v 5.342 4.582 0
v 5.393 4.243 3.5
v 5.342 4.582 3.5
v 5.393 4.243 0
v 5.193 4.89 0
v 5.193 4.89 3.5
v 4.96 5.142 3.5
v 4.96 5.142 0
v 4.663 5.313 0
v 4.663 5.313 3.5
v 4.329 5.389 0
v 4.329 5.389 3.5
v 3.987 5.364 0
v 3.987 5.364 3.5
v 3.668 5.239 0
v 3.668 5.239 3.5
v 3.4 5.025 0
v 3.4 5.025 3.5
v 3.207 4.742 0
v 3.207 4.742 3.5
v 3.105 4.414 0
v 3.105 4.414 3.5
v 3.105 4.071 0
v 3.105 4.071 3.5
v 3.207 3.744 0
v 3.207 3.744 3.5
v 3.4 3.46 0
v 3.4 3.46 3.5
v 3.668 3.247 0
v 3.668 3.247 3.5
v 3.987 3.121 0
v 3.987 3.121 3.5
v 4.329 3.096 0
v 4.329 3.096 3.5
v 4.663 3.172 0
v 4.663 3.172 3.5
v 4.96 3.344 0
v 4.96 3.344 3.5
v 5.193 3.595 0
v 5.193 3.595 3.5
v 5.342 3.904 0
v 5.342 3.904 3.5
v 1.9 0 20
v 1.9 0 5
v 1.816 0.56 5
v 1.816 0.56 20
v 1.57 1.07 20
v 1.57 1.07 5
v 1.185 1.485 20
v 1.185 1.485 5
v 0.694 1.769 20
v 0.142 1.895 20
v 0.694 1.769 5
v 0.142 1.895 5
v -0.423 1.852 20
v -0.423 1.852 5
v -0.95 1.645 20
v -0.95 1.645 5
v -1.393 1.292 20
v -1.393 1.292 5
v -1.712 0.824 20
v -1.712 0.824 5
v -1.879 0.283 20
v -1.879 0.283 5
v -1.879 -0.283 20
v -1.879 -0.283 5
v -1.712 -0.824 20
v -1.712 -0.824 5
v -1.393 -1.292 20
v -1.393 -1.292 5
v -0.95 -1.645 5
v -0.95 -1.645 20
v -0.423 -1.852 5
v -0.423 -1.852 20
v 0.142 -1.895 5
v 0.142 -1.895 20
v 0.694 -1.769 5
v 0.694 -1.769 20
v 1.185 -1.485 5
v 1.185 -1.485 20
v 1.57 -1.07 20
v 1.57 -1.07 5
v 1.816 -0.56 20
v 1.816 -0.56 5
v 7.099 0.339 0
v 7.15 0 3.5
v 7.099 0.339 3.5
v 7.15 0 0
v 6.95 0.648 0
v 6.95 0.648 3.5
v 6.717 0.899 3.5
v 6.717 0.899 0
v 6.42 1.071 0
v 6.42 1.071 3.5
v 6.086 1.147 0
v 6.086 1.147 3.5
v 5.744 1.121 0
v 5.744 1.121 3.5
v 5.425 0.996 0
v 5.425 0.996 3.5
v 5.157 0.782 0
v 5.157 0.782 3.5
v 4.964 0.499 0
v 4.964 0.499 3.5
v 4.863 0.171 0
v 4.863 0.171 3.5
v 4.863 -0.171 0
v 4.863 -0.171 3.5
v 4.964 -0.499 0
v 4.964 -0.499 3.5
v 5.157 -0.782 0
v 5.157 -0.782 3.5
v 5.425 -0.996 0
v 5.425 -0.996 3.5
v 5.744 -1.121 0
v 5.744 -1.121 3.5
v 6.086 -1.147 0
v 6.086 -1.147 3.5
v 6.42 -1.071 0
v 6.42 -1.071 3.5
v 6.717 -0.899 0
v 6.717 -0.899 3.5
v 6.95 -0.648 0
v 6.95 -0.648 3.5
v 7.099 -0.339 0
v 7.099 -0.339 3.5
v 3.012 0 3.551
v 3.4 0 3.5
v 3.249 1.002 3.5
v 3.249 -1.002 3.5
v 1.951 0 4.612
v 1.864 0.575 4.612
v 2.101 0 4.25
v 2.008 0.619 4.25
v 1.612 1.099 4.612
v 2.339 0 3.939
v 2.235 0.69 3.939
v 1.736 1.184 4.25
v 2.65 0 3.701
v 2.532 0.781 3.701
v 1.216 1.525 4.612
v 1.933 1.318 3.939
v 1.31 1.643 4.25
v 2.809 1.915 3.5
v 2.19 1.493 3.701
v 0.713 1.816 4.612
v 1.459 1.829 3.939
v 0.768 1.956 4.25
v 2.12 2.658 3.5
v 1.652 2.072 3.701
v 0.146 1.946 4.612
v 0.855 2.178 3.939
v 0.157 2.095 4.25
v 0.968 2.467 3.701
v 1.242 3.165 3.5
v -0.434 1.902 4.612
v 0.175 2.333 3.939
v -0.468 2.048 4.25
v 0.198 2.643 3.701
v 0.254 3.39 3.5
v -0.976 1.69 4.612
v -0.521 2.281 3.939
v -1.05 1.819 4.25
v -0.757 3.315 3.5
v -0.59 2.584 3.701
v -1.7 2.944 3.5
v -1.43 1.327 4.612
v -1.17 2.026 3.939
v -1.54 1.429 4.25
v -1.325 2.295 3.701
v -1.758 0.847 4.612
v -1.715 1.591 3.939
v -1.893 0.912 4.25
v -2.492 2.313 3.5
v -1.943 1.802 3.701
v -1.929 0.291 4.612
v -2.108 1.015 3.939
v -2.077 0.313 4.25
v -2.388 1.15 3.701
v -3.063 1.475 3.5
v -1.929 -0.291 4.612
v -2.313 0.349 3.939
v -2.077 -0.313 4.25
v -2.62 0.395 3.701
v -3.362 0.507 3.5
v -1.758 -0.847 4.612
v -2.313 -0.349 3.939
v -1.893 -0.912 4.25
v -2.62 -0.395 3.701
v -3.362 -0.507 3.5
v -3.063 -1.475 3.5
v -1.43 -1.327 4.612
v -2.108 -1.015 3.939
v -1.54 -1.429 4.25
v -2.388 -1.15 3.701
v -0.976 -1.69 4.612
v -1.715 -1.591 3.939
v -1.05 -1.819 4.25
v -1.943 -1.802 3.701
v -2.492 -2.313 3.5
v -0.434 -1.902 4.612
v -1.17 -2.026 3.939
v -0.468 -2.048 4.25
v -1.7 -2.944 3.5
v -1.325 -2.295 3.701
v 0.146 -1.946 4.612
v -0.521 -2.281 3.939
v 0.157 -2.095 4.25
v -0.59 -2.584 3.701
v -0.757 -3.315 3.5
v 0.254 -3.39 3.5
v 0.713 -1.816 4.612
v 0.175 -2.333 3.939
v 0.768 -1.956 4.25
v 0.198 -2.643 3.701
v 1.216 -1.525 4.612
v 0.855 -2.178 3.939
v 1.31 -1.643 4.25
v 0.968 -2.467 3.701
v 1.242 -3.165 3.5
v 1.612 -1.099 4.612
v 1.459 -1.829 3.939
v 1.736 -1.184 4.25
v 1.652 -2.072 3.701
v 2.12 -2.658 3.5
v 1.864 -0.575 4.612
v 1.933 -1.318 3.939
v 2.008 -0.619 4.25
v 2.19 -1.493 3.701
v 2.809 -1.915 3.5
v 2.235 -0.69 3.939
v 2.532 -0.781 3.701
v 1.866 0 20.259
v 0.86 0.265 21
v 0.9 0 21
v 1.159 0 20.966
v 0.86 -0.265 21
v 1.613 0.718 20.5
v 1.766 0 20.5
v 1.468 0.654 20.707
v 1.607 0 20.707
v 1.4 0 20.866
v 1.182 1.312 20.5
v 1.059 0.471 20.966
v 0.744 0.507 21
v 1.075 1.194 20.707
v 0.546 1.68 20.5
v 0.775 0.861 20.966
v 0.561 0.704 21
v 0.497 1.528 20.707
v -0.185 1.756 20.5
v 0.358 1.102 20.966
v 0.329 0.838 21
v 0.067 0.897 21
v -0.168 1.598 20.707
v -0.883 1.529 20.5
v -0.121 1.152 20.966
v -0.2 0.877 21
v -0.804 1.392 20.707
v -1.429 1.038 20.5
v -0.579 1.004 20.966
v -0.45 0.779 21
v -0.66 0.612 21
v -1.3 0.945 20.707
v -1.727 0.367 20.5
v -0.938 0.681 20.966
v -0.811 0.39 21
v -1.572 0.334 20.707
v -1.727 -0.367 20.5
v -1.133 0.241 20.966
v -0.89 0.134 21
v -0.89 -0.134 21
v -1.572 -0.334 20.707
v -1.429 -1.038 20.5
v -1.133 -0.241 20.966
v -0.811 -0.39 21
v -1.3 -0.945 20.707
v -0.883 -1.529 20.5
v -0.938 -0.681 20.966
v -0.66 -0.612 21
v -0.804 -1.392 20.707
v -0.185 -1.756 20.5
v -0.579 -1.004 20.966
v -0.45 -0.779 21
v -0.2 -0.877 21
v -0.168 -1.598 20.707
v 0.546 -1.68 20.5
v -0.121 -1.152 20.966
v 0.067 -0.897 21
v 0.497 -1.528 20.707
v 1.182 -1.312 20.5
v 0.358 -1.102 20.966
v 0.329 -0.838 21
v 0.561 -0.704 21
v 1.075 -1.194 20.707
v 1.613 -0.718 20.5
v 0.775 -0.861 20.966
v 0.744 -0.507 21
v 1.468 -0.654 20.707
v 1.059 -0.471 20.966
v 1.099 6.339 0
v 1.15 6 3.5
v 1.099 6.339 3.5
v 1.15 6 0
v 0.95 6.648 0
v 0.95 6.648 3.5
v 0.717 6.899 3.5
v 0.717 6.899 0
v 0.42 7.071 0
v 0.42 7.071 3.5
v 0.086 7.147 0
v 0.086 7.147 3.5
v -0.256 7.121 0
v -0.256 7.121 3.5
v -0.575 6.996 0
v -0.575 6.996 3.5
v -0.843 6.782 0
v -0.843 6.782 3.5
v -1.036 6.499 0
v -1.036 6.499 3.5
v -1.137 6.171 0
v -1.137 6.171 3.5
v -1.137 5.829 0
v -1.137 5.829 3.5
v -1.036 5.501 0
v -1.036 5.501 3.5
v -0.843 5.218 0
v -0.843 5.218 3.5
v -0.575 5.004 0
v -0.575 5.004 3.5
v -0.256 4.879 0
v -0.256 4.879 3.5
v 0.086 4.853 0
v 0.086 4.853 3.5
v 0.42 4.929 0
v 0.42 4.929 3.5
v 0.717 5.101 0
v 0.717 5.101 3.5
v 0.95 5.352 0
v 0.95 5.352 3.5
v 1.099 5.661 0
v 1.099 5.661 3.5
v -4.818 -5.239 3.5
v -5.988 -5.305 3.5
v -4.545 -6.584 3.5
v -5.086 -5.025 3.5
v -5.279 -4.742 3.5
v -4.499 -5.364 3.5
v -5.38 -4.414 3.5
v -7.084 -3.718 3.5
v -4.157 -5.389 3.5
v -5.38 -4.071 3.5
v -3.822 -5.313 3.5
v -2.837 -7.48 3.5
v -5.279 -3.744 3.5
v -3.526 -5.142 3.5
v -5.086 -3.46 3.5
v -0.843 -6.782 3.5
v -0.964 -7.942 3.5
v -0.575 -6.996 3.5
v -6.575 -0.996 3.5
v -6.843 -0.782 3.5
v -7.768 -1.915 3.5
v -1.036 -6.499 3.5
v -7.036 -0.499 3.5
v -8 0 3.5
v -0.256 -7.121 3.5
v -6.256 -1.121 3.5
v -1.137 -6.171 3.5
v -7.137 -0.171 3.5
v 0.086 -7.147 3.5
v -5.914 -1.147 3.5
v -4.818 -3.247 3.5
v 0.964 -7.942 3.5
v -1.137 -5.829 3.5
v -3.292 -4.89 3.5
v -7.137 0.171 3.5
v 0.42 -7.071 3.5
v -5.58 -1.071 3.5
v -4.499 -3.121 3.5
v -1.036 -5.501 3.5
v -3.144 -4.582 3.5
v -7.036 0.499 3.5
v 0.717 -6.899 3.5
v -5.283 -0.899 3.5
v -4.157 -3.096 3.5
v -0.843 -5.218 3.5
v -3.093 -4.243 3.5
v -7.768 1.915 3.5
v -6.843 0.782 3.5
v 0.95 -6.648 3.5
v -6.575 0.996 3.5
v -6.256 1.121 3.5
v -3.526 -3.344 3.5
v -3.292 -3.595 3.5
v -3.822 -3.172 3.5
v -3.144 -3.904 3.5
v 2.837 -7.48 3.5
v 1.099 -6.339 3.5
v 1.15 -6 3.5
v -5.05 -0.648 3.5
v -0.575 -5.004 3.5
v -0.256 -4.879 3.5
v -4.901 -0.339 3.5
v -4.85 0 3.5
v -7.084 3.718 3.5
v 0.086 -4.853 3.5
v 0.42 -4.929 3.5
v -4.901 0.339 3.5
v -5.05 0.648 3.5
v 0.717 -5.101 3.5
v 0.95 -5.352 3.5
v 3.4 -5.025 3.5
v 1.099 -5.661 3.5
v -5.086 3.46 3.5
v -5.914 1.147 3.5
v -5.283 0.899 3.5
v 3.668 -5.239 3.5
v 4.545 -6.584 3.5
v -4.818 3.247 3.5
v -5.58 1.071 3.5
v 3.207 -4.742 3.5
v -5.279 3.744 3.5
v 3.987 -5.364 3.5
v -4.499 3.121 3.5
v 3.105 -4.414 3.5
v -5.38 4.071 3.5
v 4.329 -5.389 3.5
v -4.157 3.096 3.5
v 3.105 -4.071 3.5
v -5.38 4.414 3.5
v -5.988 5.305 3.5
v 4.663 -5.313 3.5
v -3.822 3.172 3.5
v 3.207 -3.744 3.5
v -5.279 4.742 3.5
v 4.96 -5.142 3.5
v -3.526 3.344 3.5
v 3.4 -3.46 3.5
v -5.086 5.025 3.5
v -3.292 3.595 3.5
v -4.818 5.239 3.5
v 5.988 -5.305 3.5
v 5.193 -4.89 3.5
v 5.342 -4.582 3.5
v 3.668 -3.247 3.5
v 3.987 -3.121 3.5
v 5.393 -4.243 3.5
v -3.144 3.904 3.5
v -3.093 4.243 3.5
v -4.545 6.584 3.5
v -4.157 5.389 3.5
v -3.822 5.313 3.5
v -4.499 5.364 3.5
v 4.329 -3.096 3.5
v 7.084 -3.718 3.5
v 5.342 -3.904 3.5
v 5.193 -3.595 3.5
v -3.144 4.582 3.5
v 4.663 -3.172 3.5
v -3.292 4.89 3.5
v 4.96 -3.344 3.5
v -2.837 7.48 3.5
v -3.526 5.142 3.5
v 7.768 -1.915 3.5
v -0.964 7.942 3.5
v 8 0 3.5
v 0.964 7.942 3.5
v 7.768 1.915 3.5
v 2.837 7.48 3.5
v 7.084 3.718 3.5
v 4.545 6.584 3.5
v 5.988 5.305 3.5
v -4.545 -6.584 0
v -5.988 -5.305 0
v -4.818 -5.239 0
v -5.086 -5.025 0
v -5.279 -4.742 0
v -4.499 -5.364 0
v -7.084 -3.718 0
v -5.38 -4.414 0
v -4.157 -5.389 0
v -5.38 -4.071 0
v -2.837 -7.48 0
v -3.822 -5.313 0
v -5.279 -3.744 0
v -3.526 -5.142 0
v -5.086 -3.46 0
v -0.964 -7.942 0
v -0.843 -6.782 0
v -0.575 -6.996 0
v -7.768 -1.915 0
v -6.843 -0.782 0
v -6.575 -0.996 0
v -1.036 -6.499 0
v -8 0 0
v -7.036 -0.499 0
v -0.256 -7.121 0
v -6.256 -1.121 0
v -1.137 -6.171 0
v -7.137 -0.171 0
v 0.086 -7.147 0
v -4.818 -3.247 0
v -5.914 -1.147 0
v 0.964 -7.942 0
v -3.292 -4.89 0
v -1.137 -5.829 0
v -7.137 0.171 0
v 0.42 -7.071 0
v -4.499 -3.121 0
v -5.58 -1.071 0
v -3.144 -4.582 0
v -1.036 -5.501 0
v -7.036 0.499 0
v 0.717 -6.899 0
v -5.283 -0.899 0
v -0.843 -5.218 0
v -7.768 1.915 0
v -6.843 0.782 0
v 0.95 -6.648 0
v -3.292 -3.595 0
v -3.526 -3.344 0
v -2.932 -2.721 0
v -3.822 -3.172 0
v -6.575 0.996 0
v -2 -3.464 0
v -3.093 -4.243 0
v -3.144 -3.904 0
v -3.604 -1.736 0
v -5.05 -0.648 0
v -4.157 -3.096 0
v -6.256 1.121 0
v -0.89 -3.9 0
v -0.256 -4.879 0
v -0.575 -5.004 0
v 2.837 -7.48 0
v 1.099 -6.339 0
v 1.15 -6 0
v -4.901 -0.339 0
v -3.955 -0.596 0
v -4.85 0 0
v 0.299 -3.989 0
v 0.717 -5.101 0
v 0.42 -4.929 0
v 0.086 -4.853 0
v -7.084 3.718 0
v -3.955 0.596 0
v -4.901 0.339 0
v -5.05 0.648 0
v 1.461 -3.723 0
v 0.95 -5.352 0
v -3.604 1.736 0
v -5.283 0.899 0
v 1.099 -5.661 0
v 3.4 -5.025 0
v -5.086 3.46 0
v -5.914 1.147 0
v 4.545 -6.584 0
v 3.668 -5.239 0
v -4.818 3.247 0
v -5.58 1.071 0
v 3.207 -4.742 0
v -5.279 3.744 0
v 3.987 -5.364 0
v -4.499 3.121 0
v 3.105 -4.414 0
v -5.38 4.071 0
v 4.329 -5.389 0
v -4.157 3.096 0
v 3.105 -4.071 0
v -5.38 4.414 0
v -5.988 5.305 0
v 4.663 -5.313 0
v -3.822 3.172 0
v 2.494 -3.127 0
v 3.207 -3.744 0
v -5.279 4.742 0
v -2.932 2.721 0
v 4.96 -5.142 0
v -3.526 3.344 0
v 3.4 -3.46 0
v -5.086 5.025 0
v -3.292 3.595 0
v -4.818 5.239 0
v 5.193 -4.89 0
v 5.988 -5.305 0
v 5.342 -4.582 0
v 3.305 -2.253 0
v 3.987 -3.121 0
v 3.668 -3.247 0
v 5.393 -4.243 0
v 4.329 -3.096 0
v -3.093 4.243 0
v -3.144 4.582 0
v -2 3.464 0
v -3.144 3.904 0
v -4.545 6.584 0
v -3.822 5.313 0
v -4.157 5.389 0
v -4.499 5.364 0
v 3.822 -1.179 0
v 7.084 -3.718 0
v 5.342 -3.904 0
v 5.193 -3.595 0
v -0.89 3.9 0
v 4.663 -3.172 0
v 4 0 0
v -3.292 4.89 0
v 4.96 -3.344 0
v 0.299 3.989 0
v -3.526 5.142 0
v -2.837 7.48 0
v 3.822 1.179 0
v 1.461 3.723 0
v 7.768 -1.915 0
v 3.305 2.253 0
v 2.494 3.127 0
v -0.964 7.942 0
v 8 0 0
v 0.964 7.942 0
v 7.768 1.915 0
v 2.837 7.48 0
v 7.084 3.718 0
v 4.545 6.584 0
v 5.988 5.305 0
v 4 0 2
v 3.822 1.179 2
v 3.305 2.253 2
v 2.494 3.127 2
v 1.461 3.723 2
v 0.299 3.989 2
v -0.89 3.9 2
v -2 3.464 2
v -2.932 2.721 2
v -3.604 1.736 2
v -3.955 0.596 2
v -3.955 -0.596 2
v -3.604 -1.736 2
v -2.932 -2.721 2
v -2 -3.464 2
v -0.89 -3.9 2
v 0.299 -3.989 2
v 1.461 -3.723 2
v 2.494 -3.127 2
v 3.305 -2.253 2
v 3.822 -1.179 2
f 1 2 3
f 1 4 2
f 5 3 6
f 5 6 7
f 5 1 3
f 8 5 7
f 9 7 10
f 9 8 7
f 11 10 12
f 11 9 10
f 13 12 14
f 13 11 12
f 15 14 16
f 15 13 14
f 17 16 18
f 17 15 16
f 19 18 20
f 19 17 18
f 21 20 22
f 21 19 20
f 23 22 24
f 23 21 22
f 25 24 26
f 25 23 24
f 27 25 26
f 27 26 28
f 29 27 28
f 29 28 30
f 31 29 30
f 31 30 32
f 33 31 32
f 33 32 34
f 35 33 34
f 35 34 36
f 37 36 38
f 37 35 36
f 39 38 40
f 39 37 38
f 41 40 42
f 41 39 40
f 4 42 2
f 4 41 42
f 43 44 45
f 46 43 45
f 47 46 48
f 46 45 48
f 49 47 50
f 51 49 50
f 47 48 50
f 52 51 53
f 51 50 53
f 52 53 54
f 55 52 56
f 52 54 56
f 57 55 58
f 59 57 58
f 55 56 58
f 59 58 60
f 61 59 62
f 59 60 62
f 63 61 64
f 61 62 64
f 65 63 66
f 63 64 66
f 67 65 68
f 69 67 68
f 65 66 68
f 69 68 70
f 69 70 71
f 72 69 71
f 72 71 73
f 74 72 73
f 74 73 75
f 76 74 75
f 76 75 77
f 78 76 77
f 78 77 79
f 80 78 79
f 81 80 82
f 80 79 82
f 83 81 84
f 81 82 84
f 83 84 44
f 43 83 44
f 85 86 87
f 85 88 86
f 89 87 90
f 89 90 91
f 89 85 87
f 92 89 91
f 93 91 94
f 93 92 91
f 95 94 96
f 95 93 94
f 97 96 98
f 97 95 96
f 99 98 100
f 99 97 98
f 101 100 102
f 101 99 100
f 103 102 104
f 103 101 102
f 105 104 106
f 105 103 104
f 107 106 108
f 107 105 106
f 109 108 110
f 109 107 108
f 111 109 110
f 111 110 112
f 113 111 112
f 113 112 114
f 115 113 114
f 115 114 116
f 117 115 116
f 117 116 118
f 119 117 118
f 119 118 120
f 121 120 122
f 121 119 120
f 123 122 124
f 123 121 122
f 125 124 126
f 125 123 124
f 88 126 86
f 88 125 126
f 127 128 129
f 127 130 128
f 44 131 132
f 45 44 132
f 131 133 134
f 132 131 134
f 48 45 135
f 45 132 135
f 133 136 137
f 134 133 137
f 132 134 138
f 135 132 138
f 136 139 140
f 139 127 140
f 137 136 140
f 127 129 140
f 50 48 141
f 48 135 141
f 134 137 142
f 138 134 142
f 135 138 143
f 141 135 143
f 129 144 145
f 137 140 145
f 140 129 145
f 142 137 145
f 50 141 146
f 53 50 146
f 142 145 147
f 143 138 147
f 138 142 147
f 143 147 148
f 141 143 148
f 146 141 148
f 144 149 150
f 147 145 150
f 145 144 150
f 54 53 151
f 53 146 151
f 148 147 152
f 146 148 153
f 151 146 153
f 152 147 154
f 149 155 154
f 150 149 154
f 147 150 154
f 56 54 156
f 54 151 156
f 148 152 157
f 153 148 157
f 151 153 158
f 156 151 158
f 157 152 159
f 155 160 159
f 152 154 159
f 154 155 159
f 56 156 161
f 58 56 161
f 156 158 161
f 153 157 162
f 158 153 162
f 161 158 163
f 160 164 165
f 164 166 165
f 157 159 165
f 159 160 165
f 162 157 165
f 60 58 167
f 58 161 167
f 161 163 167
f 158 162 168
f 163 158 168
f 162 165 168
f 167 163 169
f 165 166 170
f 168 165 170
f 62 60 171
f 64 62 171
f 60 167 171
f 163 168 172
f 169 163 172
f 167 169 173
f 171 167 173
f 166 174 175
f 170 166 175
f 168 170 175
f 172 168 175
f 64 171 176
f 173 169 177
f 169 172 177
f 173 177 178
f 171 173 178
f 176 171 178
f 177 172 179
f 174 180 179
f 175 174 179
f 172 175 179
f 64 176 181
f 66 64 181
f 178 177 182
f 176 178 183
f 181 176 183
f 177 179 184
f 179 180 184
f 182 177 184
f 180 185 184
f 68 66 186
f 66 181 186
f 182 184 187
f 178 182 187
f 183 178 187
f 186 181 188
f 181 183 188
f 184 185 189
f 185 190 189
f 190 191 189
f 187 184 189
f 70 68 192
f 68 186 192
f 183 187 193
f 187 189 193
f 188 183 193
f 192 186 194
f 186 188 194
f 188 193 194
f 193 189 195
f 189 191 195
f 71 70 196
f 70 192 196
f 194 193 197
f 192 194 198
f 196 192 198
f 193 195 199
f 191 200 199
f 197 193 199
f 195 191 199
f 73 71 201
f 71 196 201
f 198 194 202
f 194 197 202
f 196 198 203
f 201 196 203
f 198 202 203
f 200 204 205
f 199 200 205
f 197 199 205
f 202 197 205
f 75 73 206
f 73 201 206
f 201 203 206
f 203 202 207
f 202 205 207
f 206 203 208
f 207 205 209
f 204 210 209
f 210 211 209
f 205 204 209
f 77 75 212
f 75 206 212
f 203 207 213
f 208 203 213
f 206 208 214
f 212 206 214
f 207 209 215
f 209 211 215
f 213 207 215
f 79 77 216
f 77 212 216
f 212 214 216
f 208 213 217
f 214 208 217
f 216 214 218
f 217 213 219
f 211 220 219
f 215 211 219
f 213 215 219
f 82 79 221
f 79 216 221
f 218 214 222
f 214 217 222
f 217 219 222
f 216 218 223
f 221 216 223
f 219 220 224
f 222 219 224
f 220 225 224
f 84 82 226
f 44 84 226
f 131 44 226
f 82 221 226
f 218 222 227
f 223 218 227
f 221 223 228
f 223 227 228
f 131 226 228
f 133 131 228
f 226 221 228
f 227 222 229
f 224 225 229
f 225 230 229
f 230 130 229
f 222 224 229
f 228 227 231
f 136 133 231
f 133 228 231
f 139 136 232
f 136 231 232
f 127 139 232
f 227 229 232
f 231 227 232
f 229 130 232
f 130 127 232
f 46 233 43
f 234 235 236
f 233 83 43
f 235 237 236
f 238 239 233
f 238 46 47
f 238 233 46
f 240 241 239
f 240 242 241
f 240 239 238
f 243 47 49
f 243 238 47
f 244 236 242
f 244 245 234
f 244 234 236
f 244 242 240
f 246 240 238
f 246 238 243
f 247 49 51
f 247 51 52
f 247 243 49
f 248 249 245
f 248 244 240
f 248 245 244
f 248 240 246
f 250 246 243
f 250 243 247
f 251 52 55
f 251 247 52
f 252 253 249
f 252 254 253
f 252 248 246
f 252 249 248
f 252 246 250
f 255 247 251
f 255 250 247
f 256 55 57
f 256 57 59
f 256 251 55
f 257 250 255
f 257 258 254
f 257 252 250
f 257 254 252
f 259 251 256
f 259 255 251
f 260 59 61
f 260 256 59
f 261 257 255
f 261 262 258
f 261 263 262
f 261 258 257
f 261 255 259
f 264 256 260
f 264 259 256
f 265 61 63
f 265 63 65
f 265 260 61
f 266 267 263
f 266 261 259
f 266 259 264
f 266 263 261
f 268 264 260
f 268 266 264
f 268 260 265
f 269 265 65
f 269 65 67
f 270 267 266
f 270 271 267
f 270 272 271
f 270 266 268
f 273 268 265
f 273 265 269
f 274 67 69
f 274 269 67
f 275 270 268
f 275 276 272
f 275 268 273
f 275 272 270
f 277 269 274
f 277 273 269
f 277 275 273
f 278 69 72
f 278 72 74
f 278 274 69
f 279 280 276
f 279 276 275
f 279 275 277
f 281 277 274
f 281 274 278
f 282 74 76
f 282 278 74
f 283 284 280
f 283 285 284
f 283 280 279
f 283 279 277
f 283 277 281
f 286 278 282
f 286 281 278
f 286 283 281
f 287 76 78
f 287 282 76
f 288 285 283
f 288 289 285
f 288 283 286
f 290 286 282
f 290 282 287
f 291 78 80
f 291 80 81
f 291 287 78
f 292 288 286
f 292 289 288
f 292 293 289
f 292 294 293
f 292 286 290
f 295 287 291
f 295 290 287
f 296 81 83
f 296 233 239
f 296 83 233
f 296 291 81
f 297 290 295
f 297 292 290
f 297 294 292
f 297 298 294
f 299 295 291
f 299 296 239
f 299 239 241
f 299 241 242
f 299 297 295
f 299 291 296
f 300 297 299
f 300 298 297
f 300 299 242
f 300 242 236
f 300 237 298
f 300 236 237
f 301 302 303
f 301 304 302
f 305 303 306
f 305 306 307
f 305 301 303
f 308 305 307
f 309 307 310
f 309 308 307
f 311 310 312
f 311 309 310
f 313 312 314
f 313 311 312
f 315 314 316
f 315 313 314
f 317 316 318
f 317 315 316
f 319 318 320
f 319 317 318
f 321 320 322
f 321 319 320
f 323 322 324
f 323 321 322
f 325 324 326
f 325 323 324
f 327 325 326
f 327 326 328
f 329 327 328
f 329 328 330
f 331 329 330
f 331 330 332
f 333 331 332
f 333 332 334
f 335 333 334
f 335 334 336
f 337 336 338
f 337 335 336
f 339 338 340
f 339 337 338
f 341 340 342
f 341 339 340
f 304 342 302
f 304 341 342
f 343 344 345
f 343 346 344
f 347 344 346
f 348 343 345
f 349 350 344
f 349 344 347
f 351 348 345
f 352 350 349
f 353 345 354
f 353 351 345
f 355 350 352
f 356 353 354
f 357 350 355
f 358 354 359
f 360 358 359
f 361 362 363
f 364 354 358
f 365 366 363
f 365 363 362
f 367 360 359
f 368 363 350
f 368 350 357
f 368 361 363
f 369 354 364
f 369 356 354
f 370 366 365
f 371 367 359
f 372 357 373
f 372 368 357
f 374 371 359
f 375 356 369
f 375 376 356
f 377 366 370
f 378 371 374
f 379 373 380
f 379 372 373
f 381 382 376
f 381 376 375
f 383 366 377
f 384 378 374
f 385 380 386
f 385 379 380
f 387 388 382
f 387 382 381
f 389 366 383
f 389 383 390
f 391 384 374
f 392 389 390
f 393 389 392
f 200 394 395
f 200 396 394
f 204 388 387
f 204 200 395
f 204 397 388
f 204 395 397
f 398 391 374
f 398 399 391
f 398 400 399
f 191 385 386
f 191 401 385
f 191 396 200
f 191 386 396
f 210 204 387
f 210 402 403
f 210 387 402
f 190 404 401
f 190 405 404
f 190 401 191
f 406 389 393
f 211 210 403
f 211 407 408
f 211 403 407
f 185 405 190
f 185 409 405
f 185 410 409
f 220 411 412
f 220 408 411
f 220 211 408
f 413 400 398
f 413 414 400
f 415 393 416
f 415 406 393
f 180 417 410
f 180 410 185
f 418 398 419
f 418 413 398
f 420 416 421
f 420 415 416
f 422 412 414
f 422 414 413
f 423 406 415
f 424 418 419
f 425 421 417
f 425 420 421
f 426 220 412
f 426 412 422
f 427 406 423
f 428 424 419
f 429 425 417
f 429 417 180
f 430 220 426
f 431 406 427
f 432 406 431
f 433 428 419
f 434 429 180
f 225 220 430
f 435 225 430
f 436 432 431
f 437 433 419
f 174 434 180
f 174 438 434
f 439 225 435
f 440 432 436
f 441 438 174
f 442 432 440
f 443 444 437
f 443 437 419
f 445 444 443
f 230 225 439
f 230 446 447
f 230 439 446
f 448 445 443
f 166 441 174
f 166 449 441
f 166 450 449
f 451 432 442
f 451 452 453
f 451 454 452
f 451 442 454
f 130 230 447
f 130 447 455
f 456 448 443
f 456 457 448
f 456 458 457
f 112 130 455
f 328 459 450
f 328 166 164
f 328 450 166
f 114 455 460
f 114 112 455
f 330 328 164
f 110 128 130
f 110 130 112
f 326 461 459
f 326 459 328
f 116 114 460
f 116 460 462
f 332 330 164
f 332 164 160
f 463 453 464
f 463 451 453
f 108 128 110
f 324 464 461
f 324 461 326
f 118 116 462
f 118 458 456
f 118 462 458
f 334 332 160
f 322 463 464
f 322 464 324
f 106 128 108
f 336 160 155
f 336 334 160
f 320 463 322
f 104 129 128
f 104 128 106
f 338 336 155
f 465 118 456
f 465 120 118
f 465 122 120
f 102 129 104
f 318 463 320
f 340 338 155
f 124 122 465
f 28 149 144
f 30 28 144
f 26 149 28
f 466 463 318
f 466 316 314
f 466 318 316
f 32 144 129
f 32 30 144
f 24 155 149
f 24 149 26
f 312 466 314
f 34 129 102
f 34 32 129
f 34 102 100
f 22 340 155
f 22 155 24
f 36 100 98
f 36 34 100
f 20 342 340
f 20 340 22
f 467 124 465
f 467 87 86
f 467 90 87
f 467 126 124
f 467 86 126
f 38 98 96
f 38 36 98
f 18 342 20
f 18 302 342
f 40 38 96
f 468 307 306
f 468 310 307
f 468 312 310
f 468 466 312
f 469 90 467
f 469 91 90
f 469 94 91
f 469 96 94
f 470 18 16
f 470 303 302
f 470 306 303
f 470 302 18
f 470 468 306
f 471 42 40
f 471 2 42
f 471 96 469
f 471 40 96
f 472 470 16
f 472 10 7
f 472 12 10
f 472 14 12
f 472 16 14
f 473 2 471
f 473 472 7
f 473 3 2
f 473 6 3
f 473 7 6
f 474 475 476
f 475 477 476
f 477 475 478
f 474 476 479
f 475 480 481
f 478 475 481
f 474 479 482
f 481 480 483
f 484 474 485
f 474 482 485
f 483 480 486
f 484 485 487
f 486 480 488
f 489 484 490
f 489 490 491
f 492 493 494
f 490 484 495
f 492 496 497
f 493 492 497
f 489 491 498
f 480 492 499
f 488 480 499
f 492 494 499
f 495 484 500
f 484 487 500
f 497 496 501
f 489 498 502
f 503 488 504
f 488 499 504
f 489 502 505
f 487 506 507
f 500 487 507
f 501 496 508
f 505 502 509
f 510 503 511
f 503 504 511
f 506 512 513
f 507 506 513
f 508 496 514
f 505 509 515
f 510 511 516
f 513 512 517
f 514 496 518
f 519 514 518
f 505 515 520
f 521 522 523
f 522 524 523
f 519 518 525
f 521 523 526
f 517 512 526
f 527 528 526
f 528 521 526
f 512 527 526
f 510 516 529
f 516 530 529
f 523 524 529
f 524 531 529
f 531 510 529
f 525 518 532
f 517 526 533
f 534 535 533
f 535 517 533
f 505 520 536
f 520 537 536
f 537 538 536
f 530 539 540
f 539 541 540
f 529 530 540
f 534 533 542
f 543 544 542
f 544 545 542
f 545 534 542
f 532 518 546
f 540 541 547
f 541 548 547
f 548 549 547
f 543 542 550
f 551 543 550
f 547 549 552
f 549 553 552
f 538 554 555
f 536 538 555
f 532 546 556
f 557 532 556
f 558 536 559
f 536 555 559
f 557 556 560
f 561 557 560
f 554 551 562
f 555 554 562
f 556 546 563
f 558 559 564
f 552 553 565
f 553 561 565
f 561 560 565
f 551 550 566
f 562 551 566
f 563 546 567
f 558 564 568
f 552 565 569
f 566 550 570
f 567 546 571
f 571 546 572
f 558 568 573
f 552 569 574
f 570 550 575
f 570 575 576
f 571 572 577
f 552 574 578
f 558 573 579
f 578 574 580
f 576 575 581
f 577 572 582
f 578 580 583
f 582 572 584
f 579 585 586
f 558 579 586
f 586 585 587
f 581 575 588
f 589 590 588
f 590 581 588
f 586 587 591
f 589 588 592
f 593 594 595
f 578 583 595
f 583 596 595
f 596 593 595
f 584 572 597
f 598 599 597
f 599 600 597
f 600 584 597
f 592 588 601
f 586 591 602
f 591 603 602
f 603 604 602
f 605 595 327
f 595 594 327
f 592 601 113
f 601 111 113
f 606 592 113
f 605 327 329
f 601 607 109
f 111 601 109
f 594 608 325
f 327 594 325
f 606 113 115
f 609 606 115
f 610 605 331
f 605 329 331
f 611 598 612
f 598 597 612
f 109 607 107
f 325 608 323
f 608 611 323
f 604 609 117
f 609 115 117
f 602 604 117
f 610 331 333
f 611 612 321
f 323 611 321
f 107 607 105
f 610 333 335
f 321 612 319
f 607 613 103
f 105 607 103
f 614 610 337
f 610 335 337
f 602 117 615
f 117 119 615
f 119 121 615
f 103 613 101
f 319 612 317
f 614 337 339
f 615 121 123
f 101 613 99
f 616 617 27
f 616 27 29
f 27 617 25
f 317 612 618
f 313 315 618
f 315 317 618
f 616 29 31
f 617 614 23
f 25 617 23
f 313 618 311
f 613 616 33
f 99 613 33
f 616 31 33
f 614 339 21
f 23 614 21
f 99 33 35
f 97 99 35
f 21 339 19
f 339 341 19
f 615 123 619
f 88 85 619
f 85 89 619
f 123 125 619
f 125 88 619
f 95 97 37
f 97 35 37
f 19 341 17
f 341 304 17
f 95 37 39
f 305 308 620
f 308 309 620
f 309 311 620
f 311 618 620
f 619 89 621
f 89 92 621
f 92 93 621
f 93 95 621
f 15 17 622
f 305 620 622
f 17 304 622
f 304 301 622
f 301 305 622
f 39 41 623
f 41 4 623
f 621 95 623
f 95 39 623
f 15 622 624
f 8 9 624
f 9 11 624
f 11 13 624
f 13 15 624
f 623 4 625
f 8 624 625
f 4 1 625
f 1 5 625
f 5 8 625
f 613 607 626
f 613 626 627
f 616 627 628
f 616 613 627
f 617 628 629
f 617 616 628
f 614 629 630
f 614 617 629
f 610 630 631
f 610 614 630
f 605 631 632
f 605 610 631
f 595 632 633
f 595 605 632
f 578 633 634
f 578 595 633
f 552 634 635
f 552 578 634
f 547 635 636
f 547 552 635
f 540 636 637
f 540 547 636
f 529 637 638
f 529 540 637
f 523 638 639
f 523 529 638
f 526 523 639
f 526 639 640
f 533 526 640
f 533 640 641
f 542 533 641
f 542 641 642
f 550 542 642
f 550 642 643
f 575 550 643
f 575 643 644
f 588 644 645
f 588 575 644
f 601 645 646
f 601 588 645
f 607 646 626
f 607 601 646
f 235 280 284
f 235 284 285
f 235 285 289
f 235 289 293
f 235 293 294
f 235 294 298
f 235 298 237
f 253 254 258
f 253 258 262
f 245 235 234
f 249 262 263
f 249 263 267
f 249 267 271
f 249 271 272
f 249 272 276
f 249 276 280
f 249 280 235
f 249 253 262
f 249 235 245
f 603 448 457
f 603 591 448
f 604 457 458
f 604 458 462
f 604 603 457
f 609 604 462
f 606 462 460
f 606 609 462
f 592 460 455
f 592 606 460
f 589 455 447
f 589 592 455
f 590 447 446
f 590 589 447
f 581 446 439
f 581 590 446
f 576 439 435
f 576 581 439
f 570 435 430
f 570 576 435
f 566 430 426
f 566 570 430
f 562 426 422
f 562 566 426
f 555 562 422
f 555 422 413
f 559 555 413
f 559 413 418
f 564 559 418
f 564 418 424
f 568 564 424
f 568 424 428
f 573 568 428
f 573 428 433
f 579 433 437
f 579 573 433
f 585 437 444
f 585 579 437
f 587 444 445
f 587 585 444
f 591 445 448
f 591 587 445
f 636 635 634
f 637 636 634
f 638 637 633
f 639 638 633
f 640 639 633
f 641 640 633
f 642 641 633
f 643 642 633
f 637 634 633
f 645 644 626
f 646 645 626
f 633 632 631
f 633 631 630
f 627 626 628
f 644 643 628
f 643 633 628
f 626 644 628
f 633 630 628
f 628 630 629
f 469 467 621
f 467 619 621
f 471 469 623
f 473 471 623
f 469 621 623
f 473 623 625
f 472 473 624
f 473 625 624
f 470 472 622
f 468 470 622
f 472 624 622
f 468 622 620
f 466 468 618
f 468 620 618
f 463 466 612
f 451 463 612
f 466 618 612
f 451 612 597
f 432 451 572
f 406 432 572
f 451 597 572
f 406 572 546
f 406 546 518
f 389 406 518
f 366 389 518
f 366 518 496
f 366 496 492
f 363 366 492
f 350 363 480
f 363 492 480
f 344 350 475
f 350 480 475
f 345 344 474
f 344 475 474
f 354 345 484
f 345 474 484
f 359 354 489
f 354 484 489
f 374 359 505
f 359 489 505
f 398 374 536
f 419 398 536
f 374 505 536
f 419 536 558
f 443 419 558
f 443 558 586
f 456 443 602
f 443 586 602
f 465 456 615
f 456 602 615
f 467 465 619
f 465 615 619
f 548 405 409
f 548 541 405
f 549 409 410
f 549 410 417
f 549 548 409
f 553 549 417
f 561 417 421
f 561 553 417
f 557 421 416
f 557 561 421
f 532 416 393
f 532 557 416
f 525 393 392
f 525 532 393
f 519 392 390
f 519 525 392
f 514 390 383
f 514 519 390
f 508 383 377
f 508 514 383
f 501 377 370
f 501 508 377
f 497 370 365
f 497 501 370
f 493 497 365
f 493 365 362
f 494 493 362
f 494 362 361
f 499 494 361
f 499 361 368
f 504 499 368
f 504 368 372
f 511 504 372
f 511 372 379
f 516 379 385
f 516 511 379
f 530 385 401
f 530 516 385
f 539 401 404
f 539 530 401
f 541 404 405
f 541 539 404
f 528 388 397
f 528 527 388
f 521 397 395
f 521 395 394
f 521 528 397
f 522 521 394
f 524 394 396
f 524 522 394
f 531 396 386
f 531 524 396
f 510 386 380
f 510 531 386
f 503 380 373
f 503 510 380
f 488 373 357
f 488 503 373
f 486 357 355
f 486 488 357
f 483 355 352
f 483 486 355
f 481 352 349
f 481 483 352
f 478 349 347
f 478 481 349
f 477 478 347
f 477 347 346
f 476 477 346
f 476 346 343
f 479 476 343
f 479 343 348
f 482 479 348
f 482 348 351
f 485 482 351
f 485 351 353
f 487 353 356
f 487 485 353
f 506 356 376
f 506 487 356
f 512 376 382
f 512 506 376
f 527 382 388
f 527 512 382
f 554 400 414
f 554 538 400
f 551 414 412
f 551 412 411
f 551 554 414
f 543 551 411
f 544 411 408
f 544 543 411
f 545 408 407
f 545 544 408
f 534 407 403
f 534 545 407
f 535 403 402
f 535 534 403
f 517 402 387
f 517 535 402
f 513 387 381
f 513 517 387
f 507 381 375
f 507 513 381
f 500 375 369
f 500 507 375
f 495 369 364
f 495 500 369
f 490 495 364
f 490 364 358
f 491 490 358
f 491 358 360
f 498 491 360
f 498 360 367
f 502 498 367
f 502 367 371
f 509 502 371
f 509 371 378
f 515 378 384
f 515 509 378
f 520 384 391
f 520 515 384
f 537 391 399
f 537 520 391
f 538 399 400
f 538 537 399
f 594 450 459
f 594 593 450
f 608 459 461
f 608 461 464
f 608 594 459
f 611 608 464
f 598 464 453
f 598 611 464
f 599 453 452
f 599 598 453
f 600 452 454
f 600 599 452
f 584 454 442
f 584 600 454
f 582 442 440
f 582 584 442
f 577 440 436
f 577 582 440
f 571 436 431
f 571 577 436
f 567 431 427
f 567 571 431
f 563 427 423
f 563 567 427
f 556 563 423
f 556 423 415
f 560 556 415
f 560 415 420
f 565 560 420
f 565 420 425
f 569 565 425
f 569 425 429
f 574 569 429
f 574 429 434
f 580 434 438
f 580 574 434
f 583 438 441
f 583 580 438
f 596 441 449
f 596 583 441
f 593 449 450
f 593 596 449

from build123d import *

# Parameters (mm, degrees)
SKETCH_1_R      = 8
SKETCH_1_R_2    = 1.15
SKETCH_1_R_3    = 4
EXTRUDE_1_DEPTH = 2
SKETCH_2_R      = 8
SKETCH_2_R_2    = 1.15
EXTRUDE_2_DEPTH = 1.5
SKETCH_3_R      = 1.9
EXTRUDE_3_DEPTH = 17.5
FILLET_1_R      = 1
FILLET_2_R      = 1.5


with BuildPart() as part:
    # ｽｹｯﾁ1 → ﾎﾞｽ - 押し出し1 (new body)
    with BuildSketch(Plane.XY):
        Circle(SKETCH_1_R)
        with Locations((0, 6)):
            Circle(SKETCH_1_R_2, mode=Mode.SUBTRACT)
        with Locations((4.242640687, 4.242640687)):
            Circle(SKETCH_1_R_2, mode=Mode.SUBTRACT)
        with Locations((6, 0)):
            Circle(SKETCH_1_R_2, mode=Mode.SUBTRACT)
        with Locations((4.242640687, -4.242640687)):
            Circle(SKETCH_1_R_2, mode=Mode.SUBTRACT)
        with Locations((0, -6)):
            Circle(SKETCH_1_R_2, mode=Mode.SUBTRACT)
        with Locations((-4.242640687, -4.242640687)):
            Circle(SKETCH_1_R_2, mode=Mode.SUBTRACT)
        with Locations((-6, 0)):
            Circle(SKETCH_1_R_2, mode=Mode.SUBTRACT)
        with Locations((-4.242640687, 4.242640687)):
            Circle(SKETCH_1_R_2, mode=Mode.SUBTRACT)
        Circle(SKETCH_1_R_3, mode=Mode.SUBTRACT)
    extrude(amount=EXTRUDE_1_DEPTH)

    # ｽｹｯﾁ2 → ﾎﾞｽ - 押し出し2 (add)
    with BuildSketch(Plane.XY.offset(2)):
        Circle(SKETCH_2_R)
        with Locations((0, 6)):
            Circle(SKETCH_2_R_2, mode=Mode.SUBTRACT)
        with Locations((4.242640687, 4.242640687)):
            Circle(SKETCH_2_R_2, mode=Mode.SUBTRACT)
        with Locations((6, 0)):
            Circle(SKETCH_2_R_2, mode=Mode.SUBTRACT)
        with Locations((4.242640687, -4.242640687)):
            Circle(SKETCH_2_R_2, mode=Mode.SUBTRACT)
        with Locations((0, -6)):
            Circle(SKETCH_2_R_2, mode=Mode.SUBTRACT)
        with Locations((-4.242640687, -4.242640687)):
            Circle(SKETCH_2_R_2, mode=Mode.SUBTRACT)
        with Locations((-6, 0)):
            Circle(SKETCH_2_R_2, mode=Mode.SUBTRACT)
        with Locations((-4.242640687, 4.242640687)):
            Circle(SKETCH_2_R_2, mode=Mode.SUBTRACT)
    extrude(amount=EXTRUDE_2_DEPTH)

    # ｽｹｯﾁ3 → ﾎﾞｽ - 押し出し3 (add)
    with BuildSketch(Plane.XY.offset(3.5)):
        Circle(SKETCH_3_R)
    extrude(amount=EXTRUDE_3_DEPTH)

    # ﾌｨﾚｯﾄ1
    fillet_1_edges = [part.edges().sort_by_distance(p)[0] for p in [
        (-1.9, 0, 21),
    ]]
    fillet(fillet_1_edges, radius=FILLET_1_R)

    # ﾌｨﾚｯﾄ2
    fillet_2_edges = [part.edges().sort_by_distance(p)[0] for p in [
        (-1.9, 0, 3.5),
    ]]
    fillet(fillet_2_edges, radius=FILLET_2_R)


solid = part.part
